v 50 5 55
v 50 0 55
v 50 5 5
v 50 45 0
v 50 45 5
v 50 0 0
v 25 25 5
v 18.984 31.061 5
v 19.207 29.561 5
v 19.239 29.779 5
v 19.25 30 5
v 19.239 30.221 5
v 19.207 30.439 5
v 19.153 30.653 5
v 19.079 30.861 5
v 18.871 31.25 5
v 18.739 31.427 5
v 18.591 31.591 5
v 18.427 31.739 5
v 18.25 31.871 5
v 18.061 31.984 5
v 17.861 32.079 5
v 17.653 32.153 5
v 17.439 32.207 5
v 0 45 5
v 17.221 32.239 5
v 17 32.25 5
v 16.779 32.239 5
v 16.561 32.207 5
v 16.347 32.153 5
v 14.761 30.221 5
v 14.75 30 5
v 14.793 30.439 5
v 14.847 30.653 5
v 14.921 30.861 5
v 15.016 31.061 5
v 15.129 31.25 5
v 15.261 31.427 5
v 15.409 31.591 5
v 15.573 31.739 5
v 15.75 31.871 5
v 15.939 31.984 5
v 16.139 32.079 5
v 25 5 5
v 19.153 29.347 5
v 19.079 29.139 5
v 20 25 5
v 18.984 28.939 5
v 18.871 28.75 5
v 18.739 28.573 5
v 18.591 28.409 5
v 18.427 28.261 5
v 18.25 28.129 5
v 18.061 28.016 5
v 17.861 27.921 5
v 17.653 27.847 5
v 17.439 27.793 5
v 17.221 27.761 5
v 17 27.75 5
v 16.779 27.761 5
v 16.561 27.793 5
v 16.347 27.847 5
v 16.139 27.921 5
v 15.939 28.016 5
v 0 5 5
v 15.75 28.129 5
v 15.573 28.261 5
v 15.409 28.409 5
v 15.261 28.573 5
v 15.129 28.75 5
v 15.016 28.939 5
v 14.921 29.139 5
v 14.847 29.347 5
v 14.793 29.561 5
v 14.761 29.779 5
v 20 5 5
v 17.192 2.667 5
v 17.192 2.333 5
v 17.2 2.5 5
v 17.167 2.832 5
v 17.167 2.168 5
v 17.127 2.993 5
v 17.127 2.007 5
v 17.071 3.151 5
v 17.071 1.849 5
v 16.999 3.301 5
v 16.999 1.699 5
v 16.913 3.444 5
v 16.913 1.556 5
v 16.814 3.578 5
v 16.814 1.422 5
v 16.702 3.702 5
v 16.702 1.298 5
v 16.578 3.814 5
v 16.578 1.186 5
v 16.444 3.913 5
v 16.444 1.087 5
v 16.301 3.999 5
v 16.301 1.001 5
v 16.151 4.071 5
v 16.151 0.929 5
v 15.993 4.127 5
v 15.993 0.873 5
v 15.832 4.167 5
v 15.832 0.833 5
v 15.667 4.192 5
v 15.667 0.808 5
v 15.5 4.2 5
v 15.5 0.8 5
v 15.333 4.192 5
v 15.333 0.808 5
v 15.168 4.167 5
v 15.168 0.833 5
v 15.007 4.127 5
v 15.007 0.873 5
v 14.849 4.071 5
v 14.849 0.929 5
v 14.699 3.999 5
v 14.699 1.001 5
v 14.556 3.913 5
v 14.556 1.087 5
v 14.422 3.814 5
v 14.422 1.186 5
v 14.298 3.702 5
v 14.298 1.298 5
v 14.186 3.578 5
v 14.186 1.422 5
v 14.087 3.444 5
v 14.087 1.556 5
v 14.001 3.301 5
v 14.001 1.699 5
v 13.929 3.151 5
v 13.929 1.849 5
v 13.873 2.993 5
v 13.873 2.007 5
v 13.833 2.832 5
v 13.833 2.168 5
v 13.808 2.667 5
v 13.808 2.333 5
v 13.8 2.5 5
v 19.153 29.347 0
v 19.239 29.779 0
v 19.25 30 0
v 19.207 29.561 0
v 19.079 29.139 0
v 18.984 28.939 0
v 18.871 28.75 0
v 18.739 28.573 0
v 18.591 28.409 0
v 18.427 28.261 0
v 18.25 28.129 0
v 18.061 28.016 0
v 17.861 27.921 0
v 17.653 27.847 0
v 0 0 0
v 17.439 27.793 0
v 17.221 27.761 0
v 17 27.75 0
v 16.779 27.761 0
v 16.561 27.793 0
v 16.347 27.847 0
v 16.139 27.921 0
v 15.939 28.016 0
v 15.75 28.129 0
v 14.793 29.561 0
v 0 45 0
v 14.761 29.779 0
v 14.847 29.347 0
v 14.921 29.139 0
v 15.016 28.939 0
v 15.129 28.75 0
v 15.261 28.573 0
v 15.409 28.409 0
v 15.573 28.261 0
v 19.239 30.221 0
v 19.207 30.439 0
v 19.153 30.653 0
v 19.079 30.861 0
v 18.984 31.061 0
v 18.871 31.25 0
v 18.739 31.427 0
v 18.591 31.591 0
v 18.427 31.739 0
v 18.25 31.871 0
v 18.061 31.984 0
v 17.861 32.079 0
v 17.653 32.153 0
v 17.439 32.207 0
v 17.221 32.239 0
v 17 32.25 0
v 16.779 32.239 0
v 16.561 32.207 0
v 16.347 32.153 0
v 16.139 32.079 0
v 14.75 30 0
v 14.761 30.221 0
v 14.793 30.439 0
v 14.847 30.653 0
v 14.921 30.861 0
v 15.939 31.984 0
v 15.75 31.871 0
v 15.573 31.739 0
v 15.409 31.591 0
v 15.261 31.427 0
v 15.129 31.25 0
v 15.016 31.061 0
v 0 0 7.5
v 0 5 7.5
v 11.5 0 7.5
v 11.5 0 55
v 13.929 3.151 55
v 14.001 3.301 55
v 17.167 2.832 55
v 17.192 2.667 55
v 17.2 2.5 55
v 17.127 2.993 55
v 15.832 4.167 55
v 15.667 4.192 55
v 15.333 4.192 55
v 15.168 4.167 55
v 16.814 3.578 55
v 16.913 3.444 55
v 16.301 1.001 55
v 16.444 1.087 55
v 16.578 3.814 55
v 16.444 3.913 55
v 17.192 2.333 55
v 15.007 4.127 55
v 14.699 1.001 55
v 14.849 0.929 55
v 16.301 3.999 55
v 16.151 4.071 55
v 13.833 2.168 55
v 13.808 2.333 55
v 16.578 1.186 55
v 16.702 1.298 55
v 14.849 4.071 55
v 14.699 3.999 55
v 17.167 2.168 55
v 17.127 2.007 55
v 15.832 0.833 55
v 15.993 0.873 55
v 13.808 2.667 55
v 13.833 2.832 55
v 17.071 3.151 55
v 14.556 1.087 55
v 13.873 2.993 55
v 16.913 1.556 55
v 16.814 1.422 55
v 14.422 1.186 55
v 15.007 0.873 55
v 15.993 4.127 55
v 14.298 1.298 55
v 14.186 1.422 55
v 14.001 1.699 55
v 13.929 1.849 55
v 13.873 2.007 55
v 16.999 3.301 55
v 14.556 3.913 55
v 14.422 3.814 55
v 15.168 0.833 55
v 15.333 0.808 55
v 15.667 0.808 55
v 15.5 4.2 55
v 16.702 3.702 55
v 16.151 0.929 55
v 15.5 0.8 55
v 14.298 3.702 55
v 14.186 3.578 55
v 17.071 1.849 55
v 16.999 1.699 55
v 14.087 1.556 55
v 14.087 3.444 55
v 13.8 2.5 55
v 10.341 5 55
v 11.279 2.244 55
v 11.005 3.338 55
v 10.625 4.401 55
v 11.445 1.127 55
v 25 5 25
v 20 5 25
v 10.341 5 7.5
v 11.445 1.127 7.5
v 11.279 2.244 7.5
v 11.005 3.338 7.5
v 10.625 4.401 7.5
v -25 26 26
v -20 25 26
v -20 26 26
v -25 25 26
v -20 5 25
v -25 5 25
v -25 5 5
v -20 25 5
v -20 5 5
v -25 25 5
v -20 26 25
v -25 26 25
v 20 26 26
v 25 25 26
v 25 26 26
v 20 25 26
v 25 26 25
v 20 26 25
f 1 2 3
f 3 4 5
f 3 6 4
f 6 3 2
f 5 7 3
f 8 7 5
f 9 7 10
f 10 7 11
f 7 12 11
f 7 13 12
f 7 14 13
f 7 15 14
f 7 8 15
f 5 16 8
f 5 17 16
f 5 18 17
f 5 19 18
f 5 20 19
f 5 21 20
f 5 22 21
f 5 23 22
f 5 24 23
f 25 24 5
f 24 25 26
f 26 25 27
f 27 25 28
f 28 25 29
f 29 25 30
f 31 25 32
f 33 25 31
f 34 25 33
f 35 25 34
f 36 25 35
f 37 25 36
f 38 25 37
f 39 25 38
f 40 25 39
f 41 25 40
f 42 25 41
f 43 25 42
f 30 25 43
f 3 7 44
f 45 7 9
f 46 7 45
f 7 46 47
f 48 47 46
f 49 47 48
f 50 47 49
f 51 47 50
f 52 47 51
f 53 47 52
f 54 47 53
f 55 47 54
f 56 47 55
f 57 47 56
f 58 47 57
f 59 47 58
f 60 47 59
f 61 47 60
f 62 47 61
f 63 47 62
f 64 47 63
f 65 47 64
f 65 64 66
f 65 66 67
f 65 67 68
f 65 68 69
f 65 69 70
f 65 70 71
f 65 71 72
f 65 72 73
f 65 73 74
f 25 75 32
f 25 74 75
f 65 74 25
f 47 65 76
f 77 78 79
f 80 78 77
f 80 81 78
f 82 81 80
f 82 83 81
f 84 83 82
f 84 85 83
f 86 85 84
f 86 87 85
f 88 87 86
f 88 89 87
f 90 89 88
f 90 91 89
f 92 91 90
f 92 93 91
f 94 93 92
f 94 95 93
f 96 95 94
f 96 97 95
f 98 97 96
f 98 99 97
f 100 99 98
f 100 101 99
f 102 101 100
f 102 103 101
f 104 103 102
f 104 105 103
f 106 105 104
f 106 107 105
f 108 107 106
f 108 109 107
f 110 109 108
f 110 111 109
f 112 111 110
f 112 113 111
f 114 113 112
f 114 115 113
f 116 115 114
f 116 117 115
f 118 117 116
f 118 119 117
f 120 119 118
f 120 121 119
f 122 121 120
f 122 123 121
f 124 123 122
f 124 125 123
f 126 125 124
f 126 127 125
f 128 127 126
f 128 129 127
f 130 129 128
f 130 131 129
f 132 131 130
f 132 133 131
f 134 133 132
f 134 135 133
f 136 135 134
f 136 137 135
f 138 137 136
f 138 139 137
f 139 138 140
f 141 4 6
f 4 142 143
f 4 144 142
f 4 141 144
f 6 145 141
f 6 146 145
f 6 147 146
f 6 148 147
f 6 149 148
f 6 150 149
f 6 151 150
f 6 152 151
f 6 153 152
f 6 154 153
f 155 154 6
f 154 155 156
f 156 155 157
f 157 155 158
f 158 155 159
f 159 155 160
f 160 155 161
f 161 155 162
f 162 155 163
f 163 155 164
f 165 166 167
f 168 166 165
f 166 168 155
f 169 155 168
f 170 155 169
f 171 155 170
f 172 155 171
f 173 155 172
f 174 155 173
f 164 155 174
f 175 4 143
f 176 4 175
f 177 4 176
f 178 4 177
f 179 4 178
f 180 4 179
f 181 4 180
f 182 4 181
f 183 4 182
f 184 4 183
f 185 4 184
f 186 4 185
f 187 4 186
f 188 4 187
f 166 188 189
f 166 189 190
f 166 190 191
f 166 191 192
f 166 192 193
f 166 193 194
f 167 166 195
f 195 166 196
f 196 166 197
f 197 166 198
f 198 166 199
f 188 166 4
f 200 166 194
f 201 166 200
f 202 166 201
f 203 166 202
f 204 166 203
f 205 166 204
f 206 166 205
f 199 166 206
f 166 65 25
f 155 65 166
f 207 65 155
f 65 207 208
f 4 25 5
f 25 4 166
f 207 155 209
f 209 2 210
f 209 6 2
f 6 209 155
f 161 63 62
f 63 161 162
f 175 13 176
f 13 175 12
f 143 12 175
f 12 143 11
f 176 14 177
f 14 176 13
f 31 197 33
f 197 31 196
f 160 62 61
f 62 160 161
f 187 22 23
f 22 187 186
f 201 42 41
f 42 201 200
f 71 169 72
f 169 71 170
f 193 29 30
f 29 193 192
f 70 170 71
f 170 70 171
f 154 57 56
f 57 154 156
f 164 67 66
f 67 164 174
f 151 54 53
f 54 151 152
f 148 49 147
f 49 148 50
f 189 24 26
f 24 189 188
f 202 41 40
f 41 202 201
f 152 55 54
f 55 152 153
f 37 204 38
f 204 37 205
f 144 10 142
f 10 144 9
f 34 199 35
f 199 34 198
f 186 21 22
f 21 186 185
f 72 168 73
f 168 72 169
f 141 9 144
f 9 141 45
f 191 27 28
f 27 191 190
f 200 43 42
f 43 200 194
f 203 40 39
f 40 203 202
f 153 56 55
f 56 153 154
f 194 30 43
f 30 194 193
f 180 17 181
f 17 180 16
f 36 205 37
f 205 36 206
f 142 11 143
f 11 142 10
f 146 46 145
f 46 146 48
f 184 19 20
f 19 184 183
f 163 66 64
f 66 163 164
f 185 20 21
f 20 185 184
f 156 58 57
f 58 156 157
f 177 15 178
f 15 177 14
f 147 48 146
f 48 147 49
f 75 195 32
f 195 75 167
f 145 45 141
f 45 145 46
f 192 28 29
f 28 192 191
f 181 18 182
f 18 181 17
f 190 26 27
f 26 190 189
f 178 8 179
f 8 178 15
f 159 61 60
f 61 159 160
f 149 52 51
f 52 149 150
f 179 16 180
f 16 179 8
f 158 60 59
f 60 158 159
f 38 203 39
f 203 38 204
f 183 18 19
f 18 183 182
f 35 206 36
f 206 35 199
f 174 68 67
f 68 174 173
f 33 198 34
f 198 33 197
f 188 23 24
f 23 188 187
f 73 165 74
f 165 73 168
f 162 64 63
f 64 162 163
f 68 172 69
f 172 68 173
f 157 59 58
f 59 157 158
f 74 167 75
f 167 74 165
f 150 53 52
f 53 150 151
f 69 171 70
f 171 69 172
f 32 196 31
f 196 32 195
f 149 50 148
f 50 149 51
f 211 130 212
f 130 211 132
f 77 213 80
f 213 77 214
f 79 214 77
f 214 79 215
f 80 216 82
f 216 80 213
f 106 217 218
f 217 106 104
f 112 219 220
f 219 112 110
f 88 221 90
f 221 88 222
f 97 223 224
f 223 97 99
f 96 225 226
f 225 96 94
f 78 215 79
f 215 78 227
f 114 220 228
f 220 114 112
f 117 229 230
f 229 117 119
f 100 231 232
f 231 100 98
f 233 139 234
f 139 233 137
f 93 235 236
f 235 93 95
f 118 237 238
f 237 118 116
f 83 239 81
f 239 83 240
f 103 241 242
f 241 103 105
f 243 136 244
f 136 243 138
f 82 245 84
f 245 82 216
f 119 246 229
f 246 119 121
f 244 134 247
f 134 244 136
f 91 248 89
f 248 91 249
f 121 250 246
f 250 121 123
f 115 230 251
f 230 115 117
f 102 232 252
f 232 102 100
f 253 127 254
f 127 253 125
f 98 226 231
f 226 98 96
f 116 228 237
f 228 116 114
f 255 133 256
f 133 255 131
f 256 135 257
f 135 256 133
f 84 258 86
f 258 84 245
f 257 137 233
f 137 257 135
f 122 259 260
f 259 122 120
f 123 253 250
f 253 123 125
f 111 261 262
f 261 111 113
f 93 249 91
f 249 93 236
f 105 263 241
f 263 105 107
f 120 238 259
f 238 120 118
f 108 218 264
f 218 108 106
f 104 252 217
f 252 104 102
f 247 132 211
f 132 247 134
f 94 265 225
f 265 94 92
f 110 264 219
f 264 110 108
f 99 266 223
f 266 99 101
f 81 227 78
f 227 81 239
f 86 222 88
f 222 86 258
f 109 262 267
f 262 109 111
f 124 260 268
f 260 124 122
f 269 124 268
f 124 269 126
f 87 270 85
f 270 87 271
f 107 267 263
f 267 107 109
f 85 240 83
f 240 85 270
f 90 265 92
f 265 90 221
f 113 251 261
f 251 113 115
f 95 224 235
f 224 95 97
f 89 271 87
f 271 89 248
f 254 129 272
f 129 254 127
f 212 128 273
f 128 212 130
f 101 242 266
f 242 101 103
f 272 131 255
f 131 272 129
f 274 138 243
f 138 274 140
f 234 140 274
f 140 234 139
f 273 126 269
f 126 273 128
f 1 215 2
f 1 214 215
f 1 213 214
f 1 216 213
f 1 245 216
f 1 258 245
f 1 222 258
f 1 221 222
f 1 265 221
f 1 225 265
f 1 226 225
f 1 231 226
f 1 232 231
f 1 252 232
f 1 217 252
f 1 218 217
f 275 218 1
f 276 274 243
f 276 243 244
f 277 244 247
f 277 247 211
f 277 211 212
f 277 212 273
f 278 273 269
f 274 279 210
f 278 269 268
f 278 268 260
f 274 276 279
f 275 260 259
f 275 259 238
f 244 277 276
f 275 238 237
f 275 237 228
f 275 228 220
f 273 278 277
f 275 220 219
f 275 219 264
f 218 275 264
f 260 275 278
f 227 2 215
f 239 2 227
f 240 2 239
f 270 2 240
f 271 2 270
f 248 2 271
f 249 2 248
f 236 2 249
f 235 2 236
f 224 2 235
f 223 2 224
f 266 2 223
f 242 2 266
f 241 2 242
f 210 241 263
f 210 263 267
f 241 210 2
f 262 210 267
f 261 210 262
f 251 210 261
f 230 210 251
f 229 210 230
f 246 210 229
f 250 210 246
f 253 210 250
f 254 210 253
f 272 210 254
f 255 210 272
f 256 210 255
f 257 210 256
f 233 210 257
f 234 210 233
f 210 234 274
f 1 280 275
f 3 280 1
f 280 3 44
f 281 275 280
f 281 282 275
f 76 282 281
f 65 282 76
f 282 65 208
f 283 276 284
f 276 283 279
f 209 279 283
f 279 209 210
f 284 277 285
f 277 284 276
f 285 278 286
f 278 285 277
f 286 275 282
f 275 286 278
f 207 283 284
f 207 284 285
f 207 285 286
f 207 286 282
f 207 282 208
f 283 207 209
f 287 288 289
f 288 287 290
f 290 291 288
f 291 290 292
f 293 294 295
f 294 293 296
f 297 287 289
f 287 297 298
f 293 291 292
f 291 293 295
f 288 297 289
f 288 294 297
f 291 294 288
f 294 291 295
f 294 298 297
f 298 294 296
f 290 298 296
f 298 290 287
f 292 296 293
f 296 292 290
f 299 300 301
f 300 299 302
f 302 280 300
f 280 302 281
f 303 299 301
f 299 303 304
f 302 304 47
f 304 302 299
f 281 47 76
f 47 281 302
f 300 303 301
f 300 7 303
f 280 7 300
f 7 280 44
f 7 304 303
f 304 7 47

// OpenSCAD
// L-shaped mounting bracket for NEMA 17 stepper motor
// Print orientation: base plate on bed (z = 0), builds upward

// Dimensions
base_x_min = -25;
base_x_max = 25;
base_y_min = 0;
base_y_max = 45;
base_z = 5;

motor_plate_x_min = -25;
motor_plate_x_max = 25;
motor_plate_y_min = 0;
motor_plate_y_max = 5;
motor_plate_z = 50;

// Hole positions
m4_hole_diameter = 4.5;
m4_hole_y = 30;
m4_hole_x1 = -17;
m4_hole_x2 = 17;

// Boss hole for motor centering
boss_hole_diameter = 23;
boss_hole_center_x = 0;
boss_hole_center_z = 28;

// M3 screw holes for motor mounting
m3_hole_diameter = 3.4;
m3_screw_spacing = 31; // 31mm square pattern
m3_hole_offset = m3_screw_spacing / 2;

// Gussets
gusset_thickness = 5;
gusset_leg_length = 20;
gusset_base_y = 5;
gusset_base_z = 5;

// Set resolution for smooth curves
$fn = 64;

// Main module
module mounting_bracket() {
    // Base plate (on XY plane, z = 0 to 5)
    difference() {
        cube([base_x_max - base_x_min, base_y_max - base_y_min, base_z], center = false);
        // Cut M4 through-holes
        translate([m4_hole_x1, m4_hole_y, base_z / 2]) cylinder(h = base_z + 1, r = m4_hole_diameter / 2, center = true);
        translate([m4_hole_x2, m4_hole_y, base_z / 2]) cylinder(h = base_z + 1, r = m4_hole_diameter / 2, center = true);
    }

    // Motor plate (attached to back edge of base plate, y = 0 to 5, z = 0 to 50)
    // It's a vertical plate standing on the back edge (y = 0) of the base
    translate([0, 0, base_z]) {
        difference() {
            cube([motor_plate_x_max - motor_plate_x_min, motor_plate_y_max - motor_plate_y_min, motor_plate_z], center = false);
            // Cut boss hole through the motor plate (along Y)
            translate([boss_hole_center_x, motor_plate_y_min, boss_hole_center_z]) cylinder(h = motor_plate_z + 1, r = boss_hole_diameter / 2, center = true);
            // Cut M3 screw holes (4 holes in 31mm square pattern centered on boss hole)
            for (i = [-1, 1]) {
                for (j = [-1, 1]) {
                    translate([
                        boss_hole_center_x + i * m3_hole_offset,
                        motor_plate_y_min + 2.5, // middle of Y face (5mm height)
                        boss_hole_center_z + j * m3_hole_offset
                    ]) cylinder(h = motor_plate_z + 1, r = m3_hole_diameter / 2, center = true);
                }
            }
        }
    }

    // Gussets: right triangles in YZ plane, 5mm thick, flush with left and right edges
    // Left gusset: x = -25 to -20, y = 5 to 25, z = 5 to 25 (right angle at y=5, z=5)
    translate([base_x_min, gusset_base_y, gusset_base_z]) {
        hull() {
            // Two points to form the right triangle
            translate([0, 0, 0]) cube([gusset_thickness, gusset_leg_length, gusset_leg_length], center = false);
            translate([0, gusset_leg_length, gusset_leg_length]) cube([gusset_thickness, 1, 1], center = false);
        }
    }

    // Right gusset: x = 20 to 25, y = 5 to 25, z = 5 to 25
    translate([base_x_max - gusset_thickness, gusset_base_y, gusset_base_z]) {
        hull() {
            translate([0, 0, 0]) cube([gusset_thickness, gusset_leg_length, gusset_leg_length], center = false);
            translate([0, gusset_leg_length, gusset_leg_length]) cube([gusset_thickness, 1, 1], center = false);
        }
    }
}

// Render the bracket
mounting_bracket();
